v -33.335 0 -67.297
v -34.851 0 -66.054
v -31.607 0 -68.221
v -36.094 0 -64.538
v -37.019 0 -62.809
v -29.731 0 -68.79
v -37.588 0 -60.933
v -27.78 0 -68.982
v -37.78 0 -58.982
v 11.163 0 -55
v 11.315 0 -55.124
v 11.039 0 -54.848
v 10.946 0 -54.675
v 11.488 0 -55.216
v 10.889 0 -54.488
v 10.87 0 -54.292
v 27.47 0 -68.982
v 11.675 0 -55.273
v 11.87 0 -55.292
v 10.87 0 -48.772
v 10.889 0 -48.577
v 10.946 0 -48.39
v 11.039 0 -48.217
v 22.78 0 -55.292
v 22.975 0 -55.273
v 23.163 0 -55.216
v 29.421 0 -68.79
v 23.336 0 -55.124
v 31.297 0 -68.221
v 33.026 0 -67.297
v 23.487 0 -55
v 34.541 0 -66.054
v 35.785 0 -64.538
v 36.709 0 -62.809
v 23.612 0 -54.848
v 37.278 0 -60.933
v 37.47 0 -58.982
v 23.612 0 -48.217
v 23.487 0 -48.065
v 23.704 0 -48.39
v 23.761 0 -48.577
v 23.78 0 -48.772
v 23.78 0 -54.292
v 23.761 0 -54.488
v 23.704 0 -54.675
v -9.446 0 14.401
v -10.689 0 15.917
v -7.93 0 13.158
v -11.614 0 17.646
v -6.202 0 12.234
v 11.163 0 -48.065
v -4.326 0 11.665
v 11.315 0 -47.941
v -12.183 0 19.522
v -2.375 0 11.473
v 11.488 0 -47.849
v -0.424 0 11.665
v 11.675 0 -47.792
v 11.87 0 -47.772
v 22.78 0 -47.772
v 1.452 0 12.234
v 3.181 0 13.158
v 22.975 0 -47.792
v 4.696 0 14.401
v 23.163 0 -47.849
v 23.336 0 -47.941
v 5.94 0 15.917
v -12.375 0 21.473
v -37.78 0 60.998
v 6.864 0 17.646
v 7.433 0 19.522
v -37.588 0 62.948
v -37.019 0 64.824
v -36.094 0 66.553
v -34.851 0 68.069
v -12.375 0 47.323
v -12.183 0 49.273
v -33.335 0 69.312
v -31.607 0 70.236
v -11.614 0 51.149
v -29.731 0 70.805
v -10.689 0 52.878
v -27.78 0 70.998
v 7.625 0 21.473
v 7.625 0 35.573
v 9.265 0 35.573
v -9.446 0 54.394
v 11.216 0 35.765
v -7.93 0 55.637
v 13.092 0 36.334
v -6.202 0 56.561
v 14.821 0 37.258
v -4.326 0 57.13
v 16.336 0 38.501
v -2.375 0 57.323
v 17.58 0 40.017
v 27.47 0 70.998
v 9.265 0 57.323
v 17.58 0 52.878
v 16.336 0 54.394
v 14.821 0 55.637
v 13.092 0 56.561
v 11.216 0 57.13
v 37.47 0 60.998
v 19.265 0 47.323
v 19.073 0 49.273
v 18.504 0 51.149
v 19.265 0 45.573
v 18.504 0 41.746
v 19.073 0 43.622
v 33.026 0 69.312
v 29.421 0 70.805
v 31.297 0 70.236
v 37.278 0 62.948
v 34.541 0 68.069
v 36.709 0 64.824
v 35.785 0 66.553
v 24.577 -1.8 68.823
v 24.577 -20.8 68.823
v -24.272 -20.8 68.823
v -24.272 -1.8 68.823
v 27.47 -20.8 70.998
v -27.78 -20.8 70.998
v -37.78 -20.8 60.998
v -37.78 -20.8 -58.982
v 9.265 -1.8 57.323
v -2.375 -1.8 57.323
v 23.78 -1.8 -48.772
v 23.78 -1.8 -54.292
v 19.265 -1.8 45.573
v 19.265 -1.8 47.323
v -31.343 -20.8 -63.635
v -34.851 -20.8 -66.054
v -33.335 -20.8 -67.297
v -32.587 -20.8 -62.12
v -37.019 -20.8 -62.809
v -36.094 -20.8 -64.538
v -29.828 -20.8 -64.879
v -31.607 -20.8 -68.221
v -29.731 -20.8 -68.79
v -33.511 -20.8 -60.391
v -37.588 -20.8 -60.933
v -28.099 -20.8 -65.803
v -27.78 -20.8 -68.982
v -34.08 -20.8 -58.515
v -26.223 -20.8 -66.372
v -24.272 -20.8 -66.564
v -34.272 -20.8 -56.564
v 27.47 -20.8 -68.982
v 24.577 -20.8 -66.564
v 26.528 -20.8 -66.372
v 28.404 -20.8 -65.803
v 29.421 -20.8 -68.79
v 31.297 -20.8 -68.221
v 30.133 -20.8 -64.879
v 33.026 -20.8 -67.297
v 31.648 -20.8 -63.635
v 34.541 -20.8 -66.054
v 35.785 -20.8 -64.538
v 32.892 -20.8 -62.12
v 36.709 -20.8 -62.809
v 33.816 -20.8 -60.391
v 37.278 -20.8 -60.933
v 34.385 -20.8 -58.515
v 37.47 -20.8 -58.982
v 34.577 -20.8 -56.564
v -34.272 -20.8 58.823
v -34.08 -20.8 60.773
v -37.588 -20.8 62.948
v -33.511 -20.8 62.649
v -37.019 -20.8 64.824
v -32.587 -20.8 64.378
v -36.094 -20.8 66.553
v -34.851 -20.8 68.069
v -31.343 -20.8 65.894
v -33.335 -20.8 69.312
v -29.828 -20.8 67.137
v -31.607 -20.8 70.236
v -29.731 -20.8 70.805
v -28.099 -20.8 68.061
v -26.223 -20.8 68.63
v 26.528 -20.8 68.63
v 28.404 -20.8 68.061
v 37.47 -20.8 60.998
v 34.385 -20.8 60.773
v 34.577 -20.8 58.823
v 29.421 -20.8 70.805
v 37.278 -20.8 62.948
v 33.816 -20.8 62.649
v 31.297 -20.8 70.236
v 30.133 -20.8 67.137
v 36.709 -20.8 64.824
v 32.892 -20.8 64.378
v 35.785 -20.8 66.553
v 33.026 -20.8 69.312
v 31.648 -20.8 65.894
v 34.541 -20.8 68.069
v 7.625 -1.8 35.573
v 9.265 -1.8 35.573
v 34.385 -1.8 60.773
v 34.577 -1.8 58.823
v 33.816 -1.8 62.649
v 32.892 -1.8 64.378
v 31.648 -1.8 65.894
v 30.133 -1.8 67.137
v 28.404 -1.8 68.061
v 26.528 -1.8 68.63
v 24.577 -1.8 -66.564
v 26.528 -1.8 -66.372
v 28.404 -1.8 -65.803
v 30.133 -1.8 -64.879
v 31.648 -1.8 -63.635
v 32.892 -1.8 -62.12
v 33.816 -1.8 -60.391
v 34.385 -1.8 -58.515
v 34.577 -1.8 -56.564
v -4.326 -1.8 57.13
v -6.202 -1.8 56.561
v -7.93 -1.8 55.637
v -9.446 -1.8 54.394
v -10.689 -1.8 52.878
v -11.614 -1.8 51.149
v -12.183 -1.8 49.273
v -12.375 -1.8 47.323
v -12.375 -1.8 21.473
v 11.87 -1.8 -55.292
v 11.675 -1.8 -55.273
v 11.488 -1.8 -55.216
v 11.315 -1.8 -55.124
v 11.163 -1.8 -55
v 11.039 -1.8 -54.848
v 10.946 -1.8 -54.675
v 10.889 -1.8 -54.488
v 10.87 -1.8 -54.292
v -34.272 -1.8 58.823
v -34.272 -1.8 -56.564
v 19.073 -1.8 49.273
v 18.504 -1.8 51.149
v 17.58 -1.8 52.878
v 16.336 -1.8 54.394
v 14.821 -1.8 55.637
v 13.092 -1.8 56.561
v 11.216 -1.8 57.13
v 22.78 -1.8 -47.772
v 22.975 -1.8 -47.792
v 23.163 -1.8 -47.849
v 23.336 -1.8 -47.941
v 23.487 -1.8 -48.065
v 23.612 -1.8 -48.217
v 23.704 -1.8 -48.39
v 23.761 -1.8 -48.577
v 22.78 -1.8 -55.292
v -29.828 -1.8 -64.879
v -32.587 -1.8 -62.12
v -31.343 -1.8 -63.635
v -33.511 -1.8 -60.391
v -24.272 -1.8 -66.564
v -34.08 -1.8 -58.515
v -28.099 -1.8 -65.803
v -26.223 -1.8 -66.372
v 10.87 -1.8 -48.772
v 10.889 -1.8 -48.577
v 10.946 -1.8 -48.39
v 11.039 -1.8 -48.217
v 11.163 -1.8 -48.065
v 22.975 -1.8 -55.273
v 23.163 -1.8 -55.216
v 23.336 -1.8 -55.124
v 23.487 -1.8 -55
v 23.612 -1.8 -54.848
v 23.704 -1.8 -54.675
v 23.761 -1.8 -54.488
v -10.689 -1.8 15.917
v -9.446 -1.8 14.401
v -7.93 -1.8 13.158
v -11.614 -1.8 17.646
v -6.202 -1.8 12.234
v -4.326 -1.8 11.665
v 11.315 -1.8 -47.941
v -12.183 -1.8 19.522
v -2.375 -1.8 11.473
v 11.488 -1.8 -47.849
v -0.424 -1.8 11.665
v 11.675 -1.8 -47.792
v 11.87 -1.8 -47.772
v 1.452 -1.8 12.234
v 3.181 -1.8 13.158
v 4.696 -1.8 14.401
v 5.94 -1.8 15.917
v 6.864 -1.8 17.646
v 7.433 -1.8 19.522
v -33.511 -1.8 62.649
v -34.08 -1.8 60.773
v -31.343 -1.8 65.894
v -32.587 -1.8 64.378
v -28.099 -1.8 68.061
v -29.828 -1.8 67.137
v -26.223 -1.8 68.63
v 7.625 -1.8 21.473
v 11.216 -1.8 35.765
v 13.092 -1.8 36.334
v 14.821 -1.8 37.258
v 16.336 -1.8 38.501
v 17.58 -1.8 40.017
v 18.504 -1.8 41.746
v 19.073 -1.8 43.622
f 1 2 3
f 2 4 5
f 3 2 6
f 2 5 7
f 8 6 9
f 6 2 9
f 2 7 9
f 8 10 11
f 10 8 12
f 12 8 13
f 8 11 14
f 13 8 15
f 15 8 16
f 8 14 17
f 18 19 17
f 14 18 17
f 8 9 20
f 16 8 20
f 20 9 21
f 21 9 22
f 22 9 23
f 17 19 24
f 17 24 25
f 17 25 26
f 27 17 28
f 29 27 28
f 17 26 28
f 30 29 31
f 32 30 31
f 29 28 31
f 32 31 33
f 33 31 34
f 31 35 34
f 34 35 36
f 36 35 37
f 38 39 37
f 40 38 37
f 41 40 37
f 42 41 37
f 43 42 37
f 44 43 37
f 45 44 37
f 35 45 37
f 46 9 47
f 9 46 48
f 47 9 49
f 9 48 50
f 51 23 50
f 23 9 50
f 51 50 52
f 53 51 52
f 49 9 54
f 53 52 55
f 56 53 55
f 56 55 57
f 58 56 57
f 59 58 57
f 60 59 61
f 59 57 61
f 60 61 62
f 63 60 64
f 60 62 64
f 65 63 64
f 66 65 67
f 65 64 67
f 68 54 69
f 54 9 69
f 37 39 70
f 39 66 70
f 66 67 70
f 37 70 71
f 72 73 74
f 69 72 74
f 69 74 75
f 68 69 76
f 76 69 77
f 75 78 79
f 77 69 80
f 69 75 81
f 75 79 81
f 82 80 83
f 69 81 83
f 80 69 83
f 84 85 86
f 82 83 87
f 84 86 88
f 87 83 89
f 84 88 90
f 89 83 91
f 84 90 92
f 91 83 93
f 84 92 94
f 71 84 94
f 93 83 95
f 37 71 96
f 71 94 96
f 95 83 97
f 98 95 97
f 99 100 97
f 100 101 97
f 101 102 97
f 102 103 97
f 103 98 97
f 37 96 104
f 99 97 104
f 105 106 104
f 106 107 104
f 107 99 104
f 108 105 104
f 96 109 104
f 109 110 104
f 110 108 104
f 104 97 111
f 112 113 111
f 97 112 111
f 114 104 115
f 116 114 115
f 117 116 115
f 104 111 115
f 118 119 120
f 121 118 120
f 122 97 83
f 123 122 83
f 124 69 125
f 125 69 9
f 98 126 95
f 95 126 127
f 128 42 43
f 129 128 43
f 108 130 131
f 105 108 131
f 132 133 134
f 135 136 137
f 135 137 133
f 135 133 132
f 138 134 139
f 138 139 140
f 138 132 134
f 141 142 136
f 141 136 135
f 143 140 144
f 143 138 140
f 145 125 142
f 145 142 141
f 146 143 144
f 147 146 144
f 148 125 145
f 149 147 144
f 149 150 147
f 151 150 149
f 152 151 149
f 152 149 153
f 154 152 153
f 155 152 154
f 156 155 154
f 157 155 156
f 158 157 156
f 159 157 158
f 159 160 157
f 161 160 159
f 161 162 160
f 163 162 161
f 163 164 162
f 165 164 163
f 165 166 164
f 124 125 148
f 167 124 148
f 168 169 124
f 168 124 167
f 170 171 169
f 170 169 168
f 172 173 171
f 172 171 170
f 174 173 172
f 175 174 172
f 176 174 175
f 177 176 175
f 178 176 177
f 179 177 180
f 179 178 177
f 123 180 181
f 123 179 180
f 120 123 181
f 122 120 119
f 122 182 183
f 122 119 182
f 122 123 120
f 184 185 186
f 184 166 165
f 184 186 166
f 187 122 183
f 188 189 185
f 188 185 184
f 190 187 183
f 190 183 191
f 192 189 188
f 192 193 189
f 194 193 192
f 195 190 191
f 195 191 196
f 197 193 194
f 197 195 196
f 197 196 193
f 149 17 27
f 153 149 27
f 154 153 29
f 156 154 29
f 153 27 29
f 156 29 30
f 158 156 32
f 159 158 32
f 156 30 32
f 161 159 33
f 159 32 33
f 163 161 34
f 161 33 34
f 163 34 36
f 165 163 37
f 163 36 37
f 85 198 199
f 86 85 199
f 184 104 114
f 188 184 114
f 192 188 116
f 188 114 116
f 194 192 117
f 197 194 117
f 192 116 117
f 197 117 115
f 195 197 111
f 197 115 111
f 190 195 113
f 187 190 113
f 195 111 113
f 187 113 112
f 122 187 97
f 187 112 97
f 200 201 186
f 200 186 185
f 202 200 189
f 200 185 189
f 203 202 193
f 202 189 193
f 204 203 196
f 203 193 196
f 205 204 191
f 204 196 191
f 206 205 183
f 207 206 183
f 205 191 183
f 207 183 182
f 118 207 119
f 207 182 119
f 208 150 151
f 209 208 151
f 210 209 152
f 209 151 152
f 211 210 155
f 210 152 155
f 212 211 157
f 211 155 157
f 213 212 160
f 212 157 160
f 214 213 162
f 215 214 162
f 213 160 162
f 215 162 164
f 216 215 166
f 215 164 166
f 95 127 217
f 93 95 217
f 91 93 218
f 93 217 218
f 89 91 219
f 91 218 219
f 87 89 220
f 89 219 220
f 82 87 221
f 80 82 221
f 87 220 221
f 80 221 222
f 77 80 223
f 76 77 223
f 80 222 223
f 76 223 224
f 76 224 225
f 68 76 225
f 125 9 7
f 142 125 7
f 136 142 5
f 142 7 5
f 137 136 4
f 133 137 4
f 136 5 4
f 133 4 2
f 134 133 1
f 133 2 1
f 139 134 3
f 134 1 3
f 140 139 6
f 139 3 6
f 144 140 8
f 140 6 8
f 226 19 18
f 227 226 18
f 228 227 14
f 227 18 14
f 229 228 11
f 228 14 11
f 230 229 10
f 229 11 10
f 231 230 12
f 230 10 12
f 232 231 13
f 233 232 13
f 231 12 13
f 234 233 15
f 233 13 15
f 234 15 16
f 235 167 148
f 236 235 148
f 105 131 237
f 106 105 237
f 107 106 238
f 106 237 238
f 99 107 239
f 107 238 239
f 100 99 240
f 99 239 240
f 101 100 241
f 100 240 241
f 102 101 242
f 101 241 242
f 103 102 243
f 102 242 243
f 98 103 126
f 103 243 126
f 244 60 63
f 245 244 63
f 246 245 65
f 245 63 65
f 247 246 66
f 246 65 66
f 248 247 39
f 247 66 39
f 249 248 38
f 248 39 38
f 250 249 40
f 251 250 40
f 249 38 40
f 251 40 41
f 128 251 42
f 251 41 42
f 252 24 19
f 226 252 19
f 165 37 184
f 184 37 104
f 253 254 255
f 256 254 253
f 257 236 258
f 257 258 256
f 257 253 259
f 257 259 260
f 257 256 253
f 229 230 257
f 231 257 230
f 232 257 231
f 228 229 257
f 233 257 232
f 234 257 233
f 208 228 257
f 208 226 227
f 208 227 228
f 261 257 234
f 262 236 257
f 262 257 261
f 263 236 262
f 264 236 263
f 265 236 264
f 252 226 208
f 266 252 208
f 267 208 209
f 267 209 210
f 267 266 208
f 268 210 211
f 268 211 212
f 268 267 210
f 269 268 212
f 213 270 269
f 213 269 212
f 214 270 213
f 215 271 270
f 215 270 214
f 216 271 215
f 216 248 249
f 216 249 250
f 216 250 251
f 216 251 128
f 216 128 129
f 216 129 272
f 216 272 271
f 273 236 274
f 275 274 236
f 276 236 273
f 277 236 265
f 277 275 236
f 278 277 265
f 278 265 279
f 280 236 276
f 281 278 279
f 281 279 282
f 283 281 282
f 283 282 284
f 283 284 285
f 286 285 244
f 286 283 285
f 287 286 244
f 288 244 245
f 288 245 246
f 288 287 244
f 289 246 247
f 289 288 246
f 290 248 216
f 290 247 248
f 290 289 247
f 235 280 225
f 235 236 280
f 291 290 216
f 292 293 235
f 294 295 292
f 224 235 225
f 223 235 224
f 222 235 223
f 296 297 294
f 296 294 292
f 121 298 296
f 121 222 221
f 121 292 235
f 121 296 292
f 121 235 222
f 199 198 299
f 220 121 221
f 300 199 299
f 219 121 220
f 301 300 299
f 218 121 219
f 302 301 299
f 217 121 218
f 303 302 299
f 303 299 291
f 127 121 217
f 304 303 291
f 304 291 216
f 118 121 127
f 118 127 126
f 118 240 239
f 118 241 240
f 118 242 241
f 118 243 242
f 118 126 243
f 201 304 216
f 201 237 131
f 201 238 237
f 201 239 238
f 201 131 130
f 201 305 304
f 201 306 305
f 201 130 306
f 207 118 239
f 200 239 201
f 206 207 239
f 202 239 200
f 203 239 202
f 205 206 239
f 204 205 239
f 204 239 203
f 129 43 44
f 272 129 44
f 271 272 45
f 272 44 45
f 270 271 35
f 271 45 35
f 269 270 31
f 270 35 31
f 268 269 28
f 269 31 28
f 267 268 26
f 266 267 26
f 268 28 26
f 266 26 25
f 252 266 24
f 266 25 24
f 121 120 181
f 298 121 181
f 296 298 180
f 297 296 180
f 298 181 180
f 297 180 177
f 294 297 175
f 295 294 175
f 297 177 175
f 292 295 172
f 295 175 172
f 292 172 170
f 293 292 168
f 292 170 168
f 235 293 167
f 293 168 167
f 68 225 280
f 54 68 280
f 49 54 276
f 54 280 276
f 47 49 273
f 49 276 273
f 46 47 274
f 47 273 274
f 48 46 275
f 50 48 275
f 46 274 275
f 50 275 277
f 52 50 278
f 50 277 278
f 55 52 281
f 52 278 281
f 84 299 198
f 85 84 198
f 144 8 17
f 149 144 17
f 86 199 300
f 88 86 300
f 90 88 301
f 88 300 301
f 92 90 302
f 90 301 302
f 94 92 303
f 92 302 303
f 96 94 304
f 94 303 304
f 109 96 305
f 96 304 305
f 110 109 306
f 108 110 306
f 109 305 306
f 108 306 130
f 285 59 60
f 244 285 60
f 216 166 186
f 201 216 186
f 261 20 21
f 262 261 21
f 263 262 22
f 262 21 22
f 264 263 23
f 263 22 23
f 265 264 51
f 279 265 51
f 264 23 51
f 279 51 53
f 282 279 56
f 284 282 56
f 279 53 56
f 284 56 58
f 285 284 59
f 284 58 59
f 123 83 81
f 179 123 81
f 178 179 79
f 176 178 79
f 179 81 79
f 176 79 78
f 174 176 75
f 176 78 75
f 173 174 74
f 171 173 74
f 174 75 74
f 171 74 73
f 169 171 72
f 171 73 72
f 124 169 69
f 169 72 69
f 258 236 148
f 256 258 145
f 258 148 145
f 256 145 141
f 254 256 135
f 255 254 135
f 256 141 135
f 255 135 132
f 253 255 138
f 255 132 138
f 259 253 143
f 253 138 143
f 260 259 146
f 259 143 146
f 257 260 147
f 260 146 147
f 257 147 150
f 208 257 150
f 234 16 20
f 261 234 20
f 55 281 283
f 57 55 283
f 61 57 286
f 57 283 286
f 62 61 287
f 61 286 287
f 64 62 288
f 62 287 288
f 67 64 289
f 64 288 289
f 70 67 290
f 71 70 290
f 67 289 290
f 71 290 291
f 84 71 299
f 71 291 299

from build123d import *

# Parameters (mm, degrees)
F1_DEPTH = 20.8
F3_DEPTH = 19
F5_DEPTH = 25
F7_DEPTH = 25


with BuildPart() as f1:
    # F0 (on Front) → F1 (new body)
    with BuildSketch(Plane.XZ):
        with BuildLine():
            Line((27.470242, 70.997512), (-27.779758, 70.997512))
            ThreePointArc((-27.779758, 70.997512), (-34.850826, 68.06858), (-37.779758, 60.997512))
            Line((-37.779758, 60.997512), (-37.779758, -58.982488))
            ThreePointArc((-37.779758, -58.982488), (-34.850826, -66.053556), (-27.779758, -68.982488))
            Line((-27.779758, -68.982488), (27.470242, -68.982488))
            ThreePointArc((27.470242, -68.982488), (34.54131, -66.053556), (37.470242, -58.982488))
            Line((37.470242, -58.982488), (37.470242, 60.997512))
            ThreePointArc((37.470242, 60.997512), (34.54131, 68.06858), (27.470242, 70.997512))
        make_face()
    extrude(amount=F1_DEPTH)

    # F2 (on face) → F3 (cut)
    with BuildSketch(Plane.XZ.offset(20.8)):
        with BuildLine():
            Line((24.576889, 68.822538), (-24.272246, 68.822538))
            ThreePointArc((-24.272246, 68.822538), (-31.343314, 65.893605), (-34.272246, 58.822538))
            Line((-34.272246, 58.822538), (-34.272246, -56.564314))
            ThreePointArc((-34.272246, -56.564314), (-31.343314, -63.635382), (-24.272246, -66.564314))
            Line((-24.272246, -66.564314), (24.576889, -66.564314))
            ThreePointArc((24.576889, -66.564314), (31.647957, -63.635382), (34.576889, -56.564314))
            Line((34.576889, -56.564314), (34.576889, 58.822538))
            ThreePointArc((34.576889, 58.822538), (31.647957, 65.893605), (24.576889, 68.822538))
        make_face()
    extrude(amount=-F3_DEPTH, mode=Mode.SUBTRACT)

    # F4 (on face) → F5 (cut)
    with BuildSketch(Plane.XZ.offset(1.8)):
        with BuildLine():
            Line((9.265215, 57.322538), (-2.374785, 57.322538))
            ThreePointArc((-2.374785, 57.322538), (-9.445852, 54.393605), (-12.374785, 47.322538))
            Line((-12.374785, 47.322538), (-12.374785, 21.472538))
            ThreePointArc((-12.374785, 21.472538), (-9.445852, 14.40147), (-2.374785, 11.472538))
            ThreePointArc((-2.374785, 11.472538), (4.696283, 14.40147), (7.625215, 21.472538))
            Line((7.625215, 21.472538), (7.625215, 35.572538))
            Line((7.625215, 35.572538), (9.265215, 35.572538))
            ThreePointArc((9.265215, 35.572538), (16.336283, 38.50147), (19.265215, 45.572538))
            Line((19.265215, 45.572538), (19.265215, 47.322538))
            ThreePointArc((19.265215, 47.322538), (16.336283, 54.393605), (9.265215, 57.322538))
        make_face()
    extrude(amount=-F5_DEPTH, mode=Mode.SUBTRACT)

    # F6 (on face) → F7 (cut)
    with BuildSketch(Plane(origin=(0, 0, 0), x_dir=(-1, 0, 0), z_dir=(0, 1, 0))):
        with BuildLine():
            Line((-11.870242, -47.772488), (-22.780242, -47.772488))
            ThreePointArc((-22.780242, -47.772488), (-23.487349, -48.065381), (-23.780242, -48.772488))
            Line((-23.780242, -48.772488), (-23.780242, -54.292488))
            ThreePointArc((-23.780242, -54.292488), (-23.487349, -54.999594), (-22.780242, -55.292488))
            Line((-22.780242, -55.292488), (-11.870242, -55.292488))
            ThreePointArc((-11.870242, -55.292488), (-11.163135, -54.999594), (-10.870242, -54.292488))
            Line((-10.870242, -54.292488), (-10.870242, -48.772488))
            ThreePointArc((-10.870242, -48.772488), (-11.163135, -48.065381), (-11.870242, -47.772488))
        make_face()
    extrude(amount=-F7_DEPTH, mode=Mode.SUBTRACT)


solid = f1.part
